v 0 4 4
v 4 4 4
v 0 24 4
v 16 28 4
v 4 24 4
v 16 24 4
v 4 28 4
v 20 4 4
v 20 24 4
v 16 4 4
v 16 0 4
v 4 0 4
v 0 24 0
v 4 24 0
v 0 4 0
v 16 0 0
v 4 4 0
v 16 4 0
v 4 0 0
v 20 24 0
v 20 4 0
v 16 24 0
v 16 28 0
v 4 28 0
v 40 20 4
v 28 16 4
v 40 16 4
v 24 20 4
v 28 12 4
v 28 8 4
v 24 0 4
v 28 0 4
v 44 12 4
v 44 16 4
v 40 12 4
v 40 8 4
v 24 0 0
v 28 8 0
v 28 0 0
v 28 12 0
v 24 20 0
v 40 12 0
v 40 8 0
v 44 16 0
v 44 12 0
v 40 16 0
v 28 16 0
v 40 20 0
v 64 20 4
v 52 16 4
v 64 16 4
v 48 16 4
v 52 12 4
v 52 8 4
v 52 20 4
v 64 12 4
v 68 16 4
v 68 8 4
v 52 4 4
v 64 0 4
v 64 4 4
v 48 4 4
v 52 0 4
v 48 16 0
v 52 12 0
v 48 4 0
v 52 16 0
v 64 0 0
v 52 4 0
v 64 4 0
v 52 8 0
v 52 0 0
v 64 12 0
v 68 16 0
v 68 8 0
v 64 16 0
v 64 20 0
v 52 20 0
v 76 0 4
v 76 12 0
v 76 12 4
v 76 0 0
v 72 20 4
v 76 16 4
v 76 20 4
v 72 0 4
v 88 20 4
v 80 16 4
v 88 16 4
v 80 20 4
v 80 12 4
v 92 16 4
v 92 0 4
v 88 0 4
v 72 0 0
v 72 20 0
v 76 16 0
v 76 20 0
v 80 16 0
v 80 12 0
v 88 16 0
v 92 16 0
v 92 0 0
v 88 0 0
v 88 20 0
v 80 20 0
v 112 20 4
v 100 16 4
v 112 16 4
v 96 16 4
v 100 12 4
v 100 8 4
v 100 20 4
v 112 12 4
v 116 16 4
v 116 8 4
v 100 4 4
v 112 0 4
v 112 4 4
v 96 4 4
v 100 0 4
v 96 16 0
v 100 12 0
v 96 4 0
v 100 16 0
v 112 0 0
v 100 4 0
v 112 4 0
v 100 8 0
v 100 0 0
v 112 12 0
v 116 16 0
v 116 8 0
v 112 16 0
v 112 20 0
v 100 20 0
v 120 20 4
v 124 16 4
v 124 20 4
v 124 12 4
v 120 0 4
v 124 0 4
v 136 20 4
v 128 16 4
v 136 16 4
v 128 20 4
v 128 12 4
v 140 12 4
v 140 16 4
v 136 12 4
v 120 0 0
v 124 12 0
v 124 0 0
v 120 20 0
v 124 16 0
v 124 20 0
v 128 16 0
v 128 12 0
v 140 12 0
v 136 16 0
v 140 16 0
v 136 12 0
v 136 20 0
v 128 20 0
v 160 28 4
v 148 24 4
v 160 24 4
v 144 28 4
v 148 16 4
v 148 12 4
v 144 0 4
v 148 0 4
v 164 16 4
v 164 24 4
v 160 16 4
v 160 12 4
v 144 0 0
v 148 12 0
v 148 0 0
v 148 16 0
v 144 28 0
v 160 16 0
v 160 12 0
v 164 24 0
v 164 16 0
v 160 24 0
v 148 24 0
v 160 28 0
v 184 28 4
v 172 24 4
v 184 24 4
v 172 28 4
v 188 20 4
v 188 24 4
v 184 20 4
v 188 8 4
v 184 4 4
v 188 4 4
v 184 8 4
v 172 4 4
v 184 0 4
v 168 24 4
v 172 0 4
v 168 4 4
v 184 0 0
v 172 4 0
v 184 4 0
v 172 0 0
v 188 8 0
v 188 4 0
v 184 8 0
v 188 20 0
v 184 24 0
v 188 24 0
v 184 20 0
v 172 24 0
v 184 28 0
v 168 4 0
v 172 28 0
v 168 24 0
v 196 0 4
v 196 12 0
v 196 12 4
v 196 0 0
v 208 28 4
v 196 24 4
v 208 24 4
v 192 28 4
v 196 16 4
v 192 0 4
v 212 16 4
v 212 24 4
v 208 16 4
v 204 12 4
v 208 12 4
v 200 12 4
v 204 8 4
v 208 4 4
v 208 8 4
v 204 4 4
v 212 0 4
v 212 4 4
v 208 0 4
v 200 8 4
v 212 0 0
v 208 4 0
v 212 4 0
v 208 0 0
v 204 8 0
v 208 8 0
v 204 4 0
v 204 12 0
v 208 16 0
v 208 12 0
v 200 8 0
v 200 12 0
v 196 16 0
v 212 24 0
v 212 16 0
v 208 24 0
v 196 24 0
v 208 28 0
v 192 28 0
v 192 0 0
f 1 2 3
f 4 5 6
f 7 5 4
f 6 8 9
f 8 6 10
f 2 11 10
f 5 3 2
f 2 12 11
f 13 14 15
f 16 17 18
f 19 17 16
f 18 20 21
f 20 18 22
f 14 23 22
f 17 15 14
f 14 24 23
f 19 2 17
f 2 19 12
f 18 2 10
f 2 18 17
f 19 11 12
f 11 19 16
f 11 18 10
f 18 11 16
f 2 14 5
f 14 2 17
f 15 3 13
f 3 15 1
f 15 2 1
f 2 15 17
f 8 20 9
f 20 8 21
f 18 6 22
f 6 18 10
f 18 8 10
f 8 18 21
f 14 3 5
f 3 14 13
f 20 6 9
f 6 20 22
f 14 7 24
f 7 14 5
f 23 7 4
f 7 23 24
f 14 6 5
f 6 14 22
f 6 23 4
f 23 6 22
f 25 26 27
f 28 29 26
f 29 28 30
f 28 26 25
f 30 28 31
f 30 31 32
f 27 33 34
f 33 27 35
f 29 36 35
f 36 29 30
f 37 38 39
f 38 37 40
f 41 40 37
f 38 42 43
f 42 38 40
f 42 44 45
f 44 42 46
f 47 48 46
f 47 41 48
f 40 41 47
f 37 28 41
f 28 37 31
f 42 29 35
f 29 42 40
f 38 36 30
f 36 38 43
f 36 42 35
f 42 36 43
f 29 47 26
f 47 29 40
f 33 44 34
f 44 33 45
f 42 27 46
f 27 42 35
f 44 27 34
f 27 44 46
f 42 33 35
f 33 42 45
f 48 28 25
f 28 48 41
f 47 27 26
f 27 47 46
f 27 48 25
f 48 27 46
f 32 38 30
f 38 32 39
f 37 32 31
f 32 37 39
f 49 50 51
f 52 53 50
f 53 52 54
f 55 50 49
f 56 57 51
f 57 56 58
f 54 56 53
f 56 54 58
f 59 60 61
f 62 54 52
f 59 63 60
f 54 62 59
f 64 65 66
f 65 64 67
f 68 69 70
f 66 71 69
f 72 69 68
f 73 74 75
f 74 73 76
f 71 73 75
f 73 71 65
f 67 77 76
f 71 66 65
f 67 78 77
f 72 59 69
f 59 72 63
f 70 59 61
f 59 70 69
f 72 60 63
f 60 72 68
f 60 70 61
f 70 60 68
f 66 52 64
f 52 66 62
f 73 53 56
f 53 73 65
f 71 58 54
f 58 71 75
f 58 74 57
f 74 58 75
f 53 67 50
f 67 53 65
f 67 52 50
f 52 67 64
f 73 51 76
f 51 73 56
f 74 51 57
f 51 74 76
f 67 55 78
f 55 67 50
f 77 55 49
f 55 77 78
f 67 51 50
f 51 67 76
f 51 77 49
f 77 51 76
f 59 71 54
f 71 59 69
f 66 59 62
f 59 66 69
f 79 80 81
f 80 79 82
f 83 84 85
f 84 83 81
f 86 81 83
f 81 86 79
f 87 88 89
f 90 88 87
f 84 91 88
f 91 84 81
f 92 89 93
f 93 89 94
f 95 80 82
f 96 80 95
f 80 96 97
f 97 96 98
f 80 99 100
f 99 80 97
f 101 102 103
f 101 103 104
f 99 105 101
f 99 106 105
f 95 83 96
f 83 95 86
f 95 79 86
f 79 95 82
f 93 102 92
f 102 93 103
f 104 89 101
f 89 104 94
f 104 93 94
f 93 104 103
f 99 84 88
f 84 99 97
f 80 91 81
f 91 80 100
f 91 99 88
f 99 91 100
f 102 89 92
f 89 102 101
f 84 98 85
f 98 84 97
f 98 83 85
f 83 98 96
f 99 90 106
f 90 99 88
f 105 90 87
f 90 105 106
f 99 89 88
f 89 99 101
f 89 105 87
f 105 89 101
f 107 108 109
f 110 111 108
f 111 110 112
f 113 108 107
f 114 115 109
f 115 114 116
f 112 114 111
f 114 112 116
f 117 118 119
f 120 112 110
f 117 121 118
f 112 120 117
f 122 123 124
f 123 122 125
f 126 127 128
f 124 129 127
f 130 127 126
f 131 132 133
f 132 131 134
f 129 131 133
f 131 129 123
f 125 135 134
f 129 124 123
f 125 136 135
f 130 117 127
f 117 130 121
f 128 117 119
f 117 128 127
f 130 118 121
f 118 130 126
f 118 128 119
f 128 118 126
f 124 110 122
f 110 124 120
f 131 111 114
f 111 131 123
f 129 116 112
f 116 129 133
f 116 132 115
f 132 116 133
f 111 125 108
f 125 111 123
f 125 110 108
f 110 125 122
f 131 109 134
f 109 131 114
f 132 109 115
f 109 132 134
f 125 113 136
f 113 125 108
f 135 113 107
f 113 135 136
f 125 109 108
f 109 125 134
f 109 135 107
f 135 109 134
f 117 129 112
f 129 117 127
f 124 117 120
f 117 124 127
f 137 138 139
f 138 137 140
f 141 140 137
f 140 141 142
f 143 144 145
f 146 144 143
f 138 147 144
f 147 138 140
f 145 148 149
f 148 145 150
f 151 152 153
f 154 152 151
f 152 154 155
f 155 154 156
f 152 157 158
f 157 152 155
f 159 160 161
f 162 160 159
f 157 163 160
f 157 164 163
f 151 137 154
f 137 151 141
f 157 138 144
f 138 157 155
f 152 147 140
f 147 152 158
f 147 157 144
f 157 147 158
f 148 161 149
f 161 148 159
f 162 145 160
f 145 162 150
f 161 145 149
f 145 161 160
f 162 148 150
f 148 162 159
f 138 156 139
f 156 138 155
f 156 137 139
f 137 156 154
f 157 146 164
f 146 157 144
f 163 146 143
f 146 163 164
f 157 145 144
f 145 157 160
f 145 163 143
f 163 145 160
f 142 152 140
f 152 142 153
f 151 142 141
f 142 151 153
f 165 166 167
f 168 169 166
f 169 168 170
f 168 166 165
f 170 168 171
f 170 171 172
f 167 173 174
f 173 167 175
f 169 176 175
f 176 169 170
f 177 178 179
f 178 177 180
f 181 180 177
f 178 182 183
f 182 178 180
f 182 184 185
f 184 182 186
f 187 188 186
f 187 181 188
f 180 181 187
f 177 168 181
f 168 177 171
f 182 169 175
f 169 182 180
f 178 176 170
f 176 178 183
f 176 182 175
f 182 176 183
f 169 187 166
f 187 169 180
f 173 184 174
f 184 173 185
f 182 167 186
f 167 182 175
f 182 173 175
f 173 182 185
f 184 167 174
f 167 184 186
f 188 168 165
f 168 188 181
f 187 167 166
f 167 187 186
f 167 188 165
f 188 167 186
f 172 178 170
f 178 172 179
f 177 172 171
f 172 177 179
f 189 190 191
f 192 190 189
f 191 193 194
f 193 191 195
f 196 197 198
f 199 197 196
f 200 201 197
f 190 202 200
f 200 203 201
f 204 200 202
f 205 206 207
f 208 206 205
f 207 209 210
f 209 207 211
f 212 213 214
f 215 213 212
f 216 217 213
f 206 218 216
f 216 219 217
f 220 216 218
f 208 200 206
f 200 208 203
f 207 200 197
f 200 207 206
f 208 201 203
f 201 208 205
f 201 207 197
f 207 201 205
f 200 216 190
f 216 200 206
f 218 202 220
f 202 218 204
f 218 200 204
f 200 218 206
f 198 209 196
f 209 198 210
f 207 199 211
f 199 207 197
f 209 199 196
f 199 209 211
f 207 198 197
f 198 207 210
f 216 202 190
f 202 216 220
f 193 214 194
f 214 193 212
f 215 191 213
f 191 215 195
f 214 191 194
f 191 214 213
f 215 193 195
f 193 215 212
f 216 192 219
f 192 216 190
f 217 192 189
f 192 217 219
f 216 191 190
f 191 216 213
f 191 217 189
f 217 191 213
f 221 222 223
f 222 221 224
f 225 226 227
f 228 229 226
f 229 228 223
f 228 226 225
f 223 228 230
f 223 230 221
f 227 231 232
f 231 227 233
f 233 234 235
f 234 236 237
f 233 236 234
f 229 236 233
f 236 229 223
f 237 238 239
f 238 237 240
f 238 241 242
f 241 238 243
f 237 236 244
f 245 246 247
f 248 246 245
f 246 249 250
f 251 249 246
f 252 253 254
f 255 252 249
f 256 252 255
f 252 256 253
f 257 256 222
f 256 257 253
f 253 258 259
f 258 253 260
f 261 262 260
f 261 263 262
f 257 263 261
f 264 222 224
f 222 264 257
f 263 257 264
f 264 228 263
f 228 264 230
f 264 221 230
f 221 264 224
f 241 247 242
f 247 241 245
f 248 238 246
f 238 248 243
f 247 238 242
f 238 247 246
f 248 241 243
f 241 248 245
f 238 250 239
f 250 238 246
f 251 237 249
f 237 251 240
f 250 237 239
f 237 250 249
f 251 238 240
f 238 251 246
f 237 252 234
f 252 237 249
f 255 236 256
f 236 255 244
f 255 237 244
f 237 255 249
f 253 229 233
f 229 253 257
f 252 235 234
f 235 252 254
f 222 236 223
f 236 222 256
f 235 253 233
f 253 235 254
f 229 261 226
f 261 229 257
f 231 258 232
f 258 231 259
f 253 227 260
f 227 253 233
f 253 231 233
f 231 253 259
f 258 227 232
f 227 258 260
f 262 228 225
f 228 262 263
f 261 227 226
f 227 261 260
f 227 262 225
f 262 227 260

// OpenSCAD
//Draw text
scale([4,4,4]) drawtext("OpenerPCR");

//Draw character set
//scale([2,2,2]) drawtext(" !\"#$%&'()*+,-./0123456789:;<=>?@ABCDEFGHIJKLMNOPQRSTUVWXYZ[\\]^_`abcdefghijklmnopqrstuvwxyz{|}");

module drawtext(text) {
	//Characters
	chars = " !\"#$%&'()*+,-./0123456789:;<=>?@ABCDEFGHIJKLMNOPQRSTUVWXYZ[\\]^_`abcdefghijklmnopqrstuvwxyz{|}";

	//Chracter table defining 5x7 characters
	//Adapted from: http://www.geocities.com/dinceraydin/djlcdsim/chartable.js
	char_table = [ [ 0, 0, 0, 0, 0, 0, 0],
                  [ 4, 0, 4, 4, 4, 4, 4],
                  [ 0, 0, 0, 0,10,10,10],
                  [10,10,31,10,31,10,10],
                  [ 4,30, 5,14,20,15, 4],
                  [ 3,19, 8, 4, 2,25,24],
                  [13,18,21, 8,20,18,12],
                  [ 0, 0, 0, 0, 8, 4,12],
                  [ 2, 4, 8, 8, 8, 4, 2],
                  [ 8, 4, 2, 2, 2, 4, 8],
                  [ 0, 4,21,14,21, 4, 0],
                  [ 0, 4, 4,31, 4, 4, 0],
                  [ 8, 4,12, 0, 0, 0, 0],
                  [ 0, 0, 0,31, 0, 0, 0],
                  [12,12, 0, 0, 0, 0, 0],
                  [ 0,16, 8, 4, 2, 1, 0],
                  [14,17,25,21,19,17,14],
                  [14, 4, 4, 4, 4,12, 4],
                  [31, 8, 4, 2, 1,17,14],
                  [14,17, 1, 2, 4, 2,31],
                  [ 2, 2,31,18,10, 6, 2],
                  [14,17, 1, 1,30,16,31],
                  [14,17,17,30,16, 8, 6],
                  [ 8, 8, 8, 4, 2, 1,31],
                  [14,17,17,14,17,17,14],
                  [12, 2, 1,15,17,17,14],
                  [ 0,12,12, 0,12,12, 0],
                  [ 8, 4,12, 0,12,12, 0],
                  [ 2, 4, 8,16, 8, 4, 2],
                  [ 0, 0,31, 0,31, 0, 0],
                  [16, 8, 4, 2, 4, 8,16],
                  [ 4, 0, 4, 2, 1,17,14],
                  [14,21,21,13, 1,17,14],
                  [17,17,31,17,17,17,14],
                  [30,17,17,30,17,17,30],
                  [14,17,16,16,16,17,14],
                  [30,17,17,17,17,17,30],
                  [31,16,16,30,16,16,31],
                  [16,16,16,30,16,16,31],
                  [15,17,17,23,16,17,14],
                  [17,17,17,31,17,17,17],
                  [14, 4, 4, 4, 4, 4,14],
                  [12,18, 2, 2, 2, 2, 7],
                  [17,18,20,24,20,18,17],
                  [31,16,16,16,16,16,16],
                  [17,17,17,21,21,27,17],
                  [17,17,19,21,25,17,17],
                  [14,17,17,17,17,17,14],
                  [16,16,16,30,17,17,30],
                  [13,18,21,17,17,17,14],
                  [17,18,20,30,17,17,30],
                  [30, 1, 1,14,16,16,15],
                  [ 4, 4, 4, 4, 4, 4,31],
                  [14,17,17,17,17,17,17],
                  [ 4,10,17,17,17,17,17],
                  [10,21,21,21,17,17,17],
                  [17,17,10, 4,10,17,17],
                  [ 4, 4, 4,10,17,17,17],
                  [31,16, 8, 4, 2, 1,31],
                  [14, 8, 8, 8, 8, 8,14],
                  [ 0, 1, 2, 4, 8,16, 0],
                  [14, 2, 2, 2, 2, 2,14],
                  [ 0, 0, 0, 0,17,10, 4],
                  [31, 0, 0, 0, 0, 0, 0],
                  [ 0, 0, 0, 0, 2, 4, 8],
                  [15,17,15, 1,14, 0, 0],
                  [30,17,17,25,22,16,16],
                  [14,17,16,16,14, 0, 0],
                  [15,17,17,19,13, 1, 1],
                  [14,16,31,17,14, 0, 0],
                  [ 8, 8, 8,28, 8, 9, 6],
                  [14, 1,15,17,15, 0, 0],
                  [17,17,17,25,22,16,16],
                  [14, 4, 4, 4,12, 0, 4],
                  [12,18, 2, 2, 2, 6, 2],
                  [18,20,24,20,18,16,16],
                  [14, 4, 4, 4, 4, 4,12],
                  [17,17,21,21,26, 0, 0],
                  [17,17,17,25,22, 0, 0],
                  [14,17,17,17,14, 0, 0],
                  [16,16,30,17,30, 0, 0],
                  [ 1, 1,15,19,13, 0, 0],
                  [16,16,16,25,22, 0, 0],
                  [30, 1,14,16,15, 0, 0],
                  [ 6, 9, 8, 8,28, 8, 8],
                  [13,19,17,17,17, 0, 0],
                  [ 4,10,17,17,17, 0, 0],
                  [10,21,21,17,17, 0, 0],
                  [17,10, 4,10,17, 0, 0],
                  [14, 1,15,17,17, 0, 0],
                  [31, 8, 4, 2,31, 0, 0],
                  [ 2, 4, 4, 8, 4, 4, 2],
                  [ 4, 4, 4, 4, 4, 4, 4],
                  [ 8, 4, 4, 2, 4, 4, 8] ];

	//Binary decode table
	dec_table = [ "00000", "00001", "00010", "00011", "00100", "00101",
  	            "00110", "00111", "01000", "01001", "01010", "01011",
  	            "01100", "01101", "01110", "01111", "10000", "10001",
  	            "10010", "10011", "10100", "10101", "10110", "10111",
	            "11000", "11001", "11010", "11011", "11100", "11101",
	            "11110", "11111" ];

	//Process string one character at a time
	for(itext = [0:len(text)-1]) {
		//Convert character to index
		assign(ichar = search(text[itext],chars,1)[0]) {
			//Decode character - rows
			for(irow = [0:6]) {
				assign(val = dec_table[char_table[ichar][irow]]) {
					//Decode character - cols
					for(icol = [0:4]) {
						assign(bit = search(val[icol],"01",1)[0]) {
							if(bit) {
								//Output cube
								translate([icol + (6*itext), irow, 0])
									cube([1.0001,1.0001,1]);
							}
						}
					}
				}
			}
		}
	}
}
